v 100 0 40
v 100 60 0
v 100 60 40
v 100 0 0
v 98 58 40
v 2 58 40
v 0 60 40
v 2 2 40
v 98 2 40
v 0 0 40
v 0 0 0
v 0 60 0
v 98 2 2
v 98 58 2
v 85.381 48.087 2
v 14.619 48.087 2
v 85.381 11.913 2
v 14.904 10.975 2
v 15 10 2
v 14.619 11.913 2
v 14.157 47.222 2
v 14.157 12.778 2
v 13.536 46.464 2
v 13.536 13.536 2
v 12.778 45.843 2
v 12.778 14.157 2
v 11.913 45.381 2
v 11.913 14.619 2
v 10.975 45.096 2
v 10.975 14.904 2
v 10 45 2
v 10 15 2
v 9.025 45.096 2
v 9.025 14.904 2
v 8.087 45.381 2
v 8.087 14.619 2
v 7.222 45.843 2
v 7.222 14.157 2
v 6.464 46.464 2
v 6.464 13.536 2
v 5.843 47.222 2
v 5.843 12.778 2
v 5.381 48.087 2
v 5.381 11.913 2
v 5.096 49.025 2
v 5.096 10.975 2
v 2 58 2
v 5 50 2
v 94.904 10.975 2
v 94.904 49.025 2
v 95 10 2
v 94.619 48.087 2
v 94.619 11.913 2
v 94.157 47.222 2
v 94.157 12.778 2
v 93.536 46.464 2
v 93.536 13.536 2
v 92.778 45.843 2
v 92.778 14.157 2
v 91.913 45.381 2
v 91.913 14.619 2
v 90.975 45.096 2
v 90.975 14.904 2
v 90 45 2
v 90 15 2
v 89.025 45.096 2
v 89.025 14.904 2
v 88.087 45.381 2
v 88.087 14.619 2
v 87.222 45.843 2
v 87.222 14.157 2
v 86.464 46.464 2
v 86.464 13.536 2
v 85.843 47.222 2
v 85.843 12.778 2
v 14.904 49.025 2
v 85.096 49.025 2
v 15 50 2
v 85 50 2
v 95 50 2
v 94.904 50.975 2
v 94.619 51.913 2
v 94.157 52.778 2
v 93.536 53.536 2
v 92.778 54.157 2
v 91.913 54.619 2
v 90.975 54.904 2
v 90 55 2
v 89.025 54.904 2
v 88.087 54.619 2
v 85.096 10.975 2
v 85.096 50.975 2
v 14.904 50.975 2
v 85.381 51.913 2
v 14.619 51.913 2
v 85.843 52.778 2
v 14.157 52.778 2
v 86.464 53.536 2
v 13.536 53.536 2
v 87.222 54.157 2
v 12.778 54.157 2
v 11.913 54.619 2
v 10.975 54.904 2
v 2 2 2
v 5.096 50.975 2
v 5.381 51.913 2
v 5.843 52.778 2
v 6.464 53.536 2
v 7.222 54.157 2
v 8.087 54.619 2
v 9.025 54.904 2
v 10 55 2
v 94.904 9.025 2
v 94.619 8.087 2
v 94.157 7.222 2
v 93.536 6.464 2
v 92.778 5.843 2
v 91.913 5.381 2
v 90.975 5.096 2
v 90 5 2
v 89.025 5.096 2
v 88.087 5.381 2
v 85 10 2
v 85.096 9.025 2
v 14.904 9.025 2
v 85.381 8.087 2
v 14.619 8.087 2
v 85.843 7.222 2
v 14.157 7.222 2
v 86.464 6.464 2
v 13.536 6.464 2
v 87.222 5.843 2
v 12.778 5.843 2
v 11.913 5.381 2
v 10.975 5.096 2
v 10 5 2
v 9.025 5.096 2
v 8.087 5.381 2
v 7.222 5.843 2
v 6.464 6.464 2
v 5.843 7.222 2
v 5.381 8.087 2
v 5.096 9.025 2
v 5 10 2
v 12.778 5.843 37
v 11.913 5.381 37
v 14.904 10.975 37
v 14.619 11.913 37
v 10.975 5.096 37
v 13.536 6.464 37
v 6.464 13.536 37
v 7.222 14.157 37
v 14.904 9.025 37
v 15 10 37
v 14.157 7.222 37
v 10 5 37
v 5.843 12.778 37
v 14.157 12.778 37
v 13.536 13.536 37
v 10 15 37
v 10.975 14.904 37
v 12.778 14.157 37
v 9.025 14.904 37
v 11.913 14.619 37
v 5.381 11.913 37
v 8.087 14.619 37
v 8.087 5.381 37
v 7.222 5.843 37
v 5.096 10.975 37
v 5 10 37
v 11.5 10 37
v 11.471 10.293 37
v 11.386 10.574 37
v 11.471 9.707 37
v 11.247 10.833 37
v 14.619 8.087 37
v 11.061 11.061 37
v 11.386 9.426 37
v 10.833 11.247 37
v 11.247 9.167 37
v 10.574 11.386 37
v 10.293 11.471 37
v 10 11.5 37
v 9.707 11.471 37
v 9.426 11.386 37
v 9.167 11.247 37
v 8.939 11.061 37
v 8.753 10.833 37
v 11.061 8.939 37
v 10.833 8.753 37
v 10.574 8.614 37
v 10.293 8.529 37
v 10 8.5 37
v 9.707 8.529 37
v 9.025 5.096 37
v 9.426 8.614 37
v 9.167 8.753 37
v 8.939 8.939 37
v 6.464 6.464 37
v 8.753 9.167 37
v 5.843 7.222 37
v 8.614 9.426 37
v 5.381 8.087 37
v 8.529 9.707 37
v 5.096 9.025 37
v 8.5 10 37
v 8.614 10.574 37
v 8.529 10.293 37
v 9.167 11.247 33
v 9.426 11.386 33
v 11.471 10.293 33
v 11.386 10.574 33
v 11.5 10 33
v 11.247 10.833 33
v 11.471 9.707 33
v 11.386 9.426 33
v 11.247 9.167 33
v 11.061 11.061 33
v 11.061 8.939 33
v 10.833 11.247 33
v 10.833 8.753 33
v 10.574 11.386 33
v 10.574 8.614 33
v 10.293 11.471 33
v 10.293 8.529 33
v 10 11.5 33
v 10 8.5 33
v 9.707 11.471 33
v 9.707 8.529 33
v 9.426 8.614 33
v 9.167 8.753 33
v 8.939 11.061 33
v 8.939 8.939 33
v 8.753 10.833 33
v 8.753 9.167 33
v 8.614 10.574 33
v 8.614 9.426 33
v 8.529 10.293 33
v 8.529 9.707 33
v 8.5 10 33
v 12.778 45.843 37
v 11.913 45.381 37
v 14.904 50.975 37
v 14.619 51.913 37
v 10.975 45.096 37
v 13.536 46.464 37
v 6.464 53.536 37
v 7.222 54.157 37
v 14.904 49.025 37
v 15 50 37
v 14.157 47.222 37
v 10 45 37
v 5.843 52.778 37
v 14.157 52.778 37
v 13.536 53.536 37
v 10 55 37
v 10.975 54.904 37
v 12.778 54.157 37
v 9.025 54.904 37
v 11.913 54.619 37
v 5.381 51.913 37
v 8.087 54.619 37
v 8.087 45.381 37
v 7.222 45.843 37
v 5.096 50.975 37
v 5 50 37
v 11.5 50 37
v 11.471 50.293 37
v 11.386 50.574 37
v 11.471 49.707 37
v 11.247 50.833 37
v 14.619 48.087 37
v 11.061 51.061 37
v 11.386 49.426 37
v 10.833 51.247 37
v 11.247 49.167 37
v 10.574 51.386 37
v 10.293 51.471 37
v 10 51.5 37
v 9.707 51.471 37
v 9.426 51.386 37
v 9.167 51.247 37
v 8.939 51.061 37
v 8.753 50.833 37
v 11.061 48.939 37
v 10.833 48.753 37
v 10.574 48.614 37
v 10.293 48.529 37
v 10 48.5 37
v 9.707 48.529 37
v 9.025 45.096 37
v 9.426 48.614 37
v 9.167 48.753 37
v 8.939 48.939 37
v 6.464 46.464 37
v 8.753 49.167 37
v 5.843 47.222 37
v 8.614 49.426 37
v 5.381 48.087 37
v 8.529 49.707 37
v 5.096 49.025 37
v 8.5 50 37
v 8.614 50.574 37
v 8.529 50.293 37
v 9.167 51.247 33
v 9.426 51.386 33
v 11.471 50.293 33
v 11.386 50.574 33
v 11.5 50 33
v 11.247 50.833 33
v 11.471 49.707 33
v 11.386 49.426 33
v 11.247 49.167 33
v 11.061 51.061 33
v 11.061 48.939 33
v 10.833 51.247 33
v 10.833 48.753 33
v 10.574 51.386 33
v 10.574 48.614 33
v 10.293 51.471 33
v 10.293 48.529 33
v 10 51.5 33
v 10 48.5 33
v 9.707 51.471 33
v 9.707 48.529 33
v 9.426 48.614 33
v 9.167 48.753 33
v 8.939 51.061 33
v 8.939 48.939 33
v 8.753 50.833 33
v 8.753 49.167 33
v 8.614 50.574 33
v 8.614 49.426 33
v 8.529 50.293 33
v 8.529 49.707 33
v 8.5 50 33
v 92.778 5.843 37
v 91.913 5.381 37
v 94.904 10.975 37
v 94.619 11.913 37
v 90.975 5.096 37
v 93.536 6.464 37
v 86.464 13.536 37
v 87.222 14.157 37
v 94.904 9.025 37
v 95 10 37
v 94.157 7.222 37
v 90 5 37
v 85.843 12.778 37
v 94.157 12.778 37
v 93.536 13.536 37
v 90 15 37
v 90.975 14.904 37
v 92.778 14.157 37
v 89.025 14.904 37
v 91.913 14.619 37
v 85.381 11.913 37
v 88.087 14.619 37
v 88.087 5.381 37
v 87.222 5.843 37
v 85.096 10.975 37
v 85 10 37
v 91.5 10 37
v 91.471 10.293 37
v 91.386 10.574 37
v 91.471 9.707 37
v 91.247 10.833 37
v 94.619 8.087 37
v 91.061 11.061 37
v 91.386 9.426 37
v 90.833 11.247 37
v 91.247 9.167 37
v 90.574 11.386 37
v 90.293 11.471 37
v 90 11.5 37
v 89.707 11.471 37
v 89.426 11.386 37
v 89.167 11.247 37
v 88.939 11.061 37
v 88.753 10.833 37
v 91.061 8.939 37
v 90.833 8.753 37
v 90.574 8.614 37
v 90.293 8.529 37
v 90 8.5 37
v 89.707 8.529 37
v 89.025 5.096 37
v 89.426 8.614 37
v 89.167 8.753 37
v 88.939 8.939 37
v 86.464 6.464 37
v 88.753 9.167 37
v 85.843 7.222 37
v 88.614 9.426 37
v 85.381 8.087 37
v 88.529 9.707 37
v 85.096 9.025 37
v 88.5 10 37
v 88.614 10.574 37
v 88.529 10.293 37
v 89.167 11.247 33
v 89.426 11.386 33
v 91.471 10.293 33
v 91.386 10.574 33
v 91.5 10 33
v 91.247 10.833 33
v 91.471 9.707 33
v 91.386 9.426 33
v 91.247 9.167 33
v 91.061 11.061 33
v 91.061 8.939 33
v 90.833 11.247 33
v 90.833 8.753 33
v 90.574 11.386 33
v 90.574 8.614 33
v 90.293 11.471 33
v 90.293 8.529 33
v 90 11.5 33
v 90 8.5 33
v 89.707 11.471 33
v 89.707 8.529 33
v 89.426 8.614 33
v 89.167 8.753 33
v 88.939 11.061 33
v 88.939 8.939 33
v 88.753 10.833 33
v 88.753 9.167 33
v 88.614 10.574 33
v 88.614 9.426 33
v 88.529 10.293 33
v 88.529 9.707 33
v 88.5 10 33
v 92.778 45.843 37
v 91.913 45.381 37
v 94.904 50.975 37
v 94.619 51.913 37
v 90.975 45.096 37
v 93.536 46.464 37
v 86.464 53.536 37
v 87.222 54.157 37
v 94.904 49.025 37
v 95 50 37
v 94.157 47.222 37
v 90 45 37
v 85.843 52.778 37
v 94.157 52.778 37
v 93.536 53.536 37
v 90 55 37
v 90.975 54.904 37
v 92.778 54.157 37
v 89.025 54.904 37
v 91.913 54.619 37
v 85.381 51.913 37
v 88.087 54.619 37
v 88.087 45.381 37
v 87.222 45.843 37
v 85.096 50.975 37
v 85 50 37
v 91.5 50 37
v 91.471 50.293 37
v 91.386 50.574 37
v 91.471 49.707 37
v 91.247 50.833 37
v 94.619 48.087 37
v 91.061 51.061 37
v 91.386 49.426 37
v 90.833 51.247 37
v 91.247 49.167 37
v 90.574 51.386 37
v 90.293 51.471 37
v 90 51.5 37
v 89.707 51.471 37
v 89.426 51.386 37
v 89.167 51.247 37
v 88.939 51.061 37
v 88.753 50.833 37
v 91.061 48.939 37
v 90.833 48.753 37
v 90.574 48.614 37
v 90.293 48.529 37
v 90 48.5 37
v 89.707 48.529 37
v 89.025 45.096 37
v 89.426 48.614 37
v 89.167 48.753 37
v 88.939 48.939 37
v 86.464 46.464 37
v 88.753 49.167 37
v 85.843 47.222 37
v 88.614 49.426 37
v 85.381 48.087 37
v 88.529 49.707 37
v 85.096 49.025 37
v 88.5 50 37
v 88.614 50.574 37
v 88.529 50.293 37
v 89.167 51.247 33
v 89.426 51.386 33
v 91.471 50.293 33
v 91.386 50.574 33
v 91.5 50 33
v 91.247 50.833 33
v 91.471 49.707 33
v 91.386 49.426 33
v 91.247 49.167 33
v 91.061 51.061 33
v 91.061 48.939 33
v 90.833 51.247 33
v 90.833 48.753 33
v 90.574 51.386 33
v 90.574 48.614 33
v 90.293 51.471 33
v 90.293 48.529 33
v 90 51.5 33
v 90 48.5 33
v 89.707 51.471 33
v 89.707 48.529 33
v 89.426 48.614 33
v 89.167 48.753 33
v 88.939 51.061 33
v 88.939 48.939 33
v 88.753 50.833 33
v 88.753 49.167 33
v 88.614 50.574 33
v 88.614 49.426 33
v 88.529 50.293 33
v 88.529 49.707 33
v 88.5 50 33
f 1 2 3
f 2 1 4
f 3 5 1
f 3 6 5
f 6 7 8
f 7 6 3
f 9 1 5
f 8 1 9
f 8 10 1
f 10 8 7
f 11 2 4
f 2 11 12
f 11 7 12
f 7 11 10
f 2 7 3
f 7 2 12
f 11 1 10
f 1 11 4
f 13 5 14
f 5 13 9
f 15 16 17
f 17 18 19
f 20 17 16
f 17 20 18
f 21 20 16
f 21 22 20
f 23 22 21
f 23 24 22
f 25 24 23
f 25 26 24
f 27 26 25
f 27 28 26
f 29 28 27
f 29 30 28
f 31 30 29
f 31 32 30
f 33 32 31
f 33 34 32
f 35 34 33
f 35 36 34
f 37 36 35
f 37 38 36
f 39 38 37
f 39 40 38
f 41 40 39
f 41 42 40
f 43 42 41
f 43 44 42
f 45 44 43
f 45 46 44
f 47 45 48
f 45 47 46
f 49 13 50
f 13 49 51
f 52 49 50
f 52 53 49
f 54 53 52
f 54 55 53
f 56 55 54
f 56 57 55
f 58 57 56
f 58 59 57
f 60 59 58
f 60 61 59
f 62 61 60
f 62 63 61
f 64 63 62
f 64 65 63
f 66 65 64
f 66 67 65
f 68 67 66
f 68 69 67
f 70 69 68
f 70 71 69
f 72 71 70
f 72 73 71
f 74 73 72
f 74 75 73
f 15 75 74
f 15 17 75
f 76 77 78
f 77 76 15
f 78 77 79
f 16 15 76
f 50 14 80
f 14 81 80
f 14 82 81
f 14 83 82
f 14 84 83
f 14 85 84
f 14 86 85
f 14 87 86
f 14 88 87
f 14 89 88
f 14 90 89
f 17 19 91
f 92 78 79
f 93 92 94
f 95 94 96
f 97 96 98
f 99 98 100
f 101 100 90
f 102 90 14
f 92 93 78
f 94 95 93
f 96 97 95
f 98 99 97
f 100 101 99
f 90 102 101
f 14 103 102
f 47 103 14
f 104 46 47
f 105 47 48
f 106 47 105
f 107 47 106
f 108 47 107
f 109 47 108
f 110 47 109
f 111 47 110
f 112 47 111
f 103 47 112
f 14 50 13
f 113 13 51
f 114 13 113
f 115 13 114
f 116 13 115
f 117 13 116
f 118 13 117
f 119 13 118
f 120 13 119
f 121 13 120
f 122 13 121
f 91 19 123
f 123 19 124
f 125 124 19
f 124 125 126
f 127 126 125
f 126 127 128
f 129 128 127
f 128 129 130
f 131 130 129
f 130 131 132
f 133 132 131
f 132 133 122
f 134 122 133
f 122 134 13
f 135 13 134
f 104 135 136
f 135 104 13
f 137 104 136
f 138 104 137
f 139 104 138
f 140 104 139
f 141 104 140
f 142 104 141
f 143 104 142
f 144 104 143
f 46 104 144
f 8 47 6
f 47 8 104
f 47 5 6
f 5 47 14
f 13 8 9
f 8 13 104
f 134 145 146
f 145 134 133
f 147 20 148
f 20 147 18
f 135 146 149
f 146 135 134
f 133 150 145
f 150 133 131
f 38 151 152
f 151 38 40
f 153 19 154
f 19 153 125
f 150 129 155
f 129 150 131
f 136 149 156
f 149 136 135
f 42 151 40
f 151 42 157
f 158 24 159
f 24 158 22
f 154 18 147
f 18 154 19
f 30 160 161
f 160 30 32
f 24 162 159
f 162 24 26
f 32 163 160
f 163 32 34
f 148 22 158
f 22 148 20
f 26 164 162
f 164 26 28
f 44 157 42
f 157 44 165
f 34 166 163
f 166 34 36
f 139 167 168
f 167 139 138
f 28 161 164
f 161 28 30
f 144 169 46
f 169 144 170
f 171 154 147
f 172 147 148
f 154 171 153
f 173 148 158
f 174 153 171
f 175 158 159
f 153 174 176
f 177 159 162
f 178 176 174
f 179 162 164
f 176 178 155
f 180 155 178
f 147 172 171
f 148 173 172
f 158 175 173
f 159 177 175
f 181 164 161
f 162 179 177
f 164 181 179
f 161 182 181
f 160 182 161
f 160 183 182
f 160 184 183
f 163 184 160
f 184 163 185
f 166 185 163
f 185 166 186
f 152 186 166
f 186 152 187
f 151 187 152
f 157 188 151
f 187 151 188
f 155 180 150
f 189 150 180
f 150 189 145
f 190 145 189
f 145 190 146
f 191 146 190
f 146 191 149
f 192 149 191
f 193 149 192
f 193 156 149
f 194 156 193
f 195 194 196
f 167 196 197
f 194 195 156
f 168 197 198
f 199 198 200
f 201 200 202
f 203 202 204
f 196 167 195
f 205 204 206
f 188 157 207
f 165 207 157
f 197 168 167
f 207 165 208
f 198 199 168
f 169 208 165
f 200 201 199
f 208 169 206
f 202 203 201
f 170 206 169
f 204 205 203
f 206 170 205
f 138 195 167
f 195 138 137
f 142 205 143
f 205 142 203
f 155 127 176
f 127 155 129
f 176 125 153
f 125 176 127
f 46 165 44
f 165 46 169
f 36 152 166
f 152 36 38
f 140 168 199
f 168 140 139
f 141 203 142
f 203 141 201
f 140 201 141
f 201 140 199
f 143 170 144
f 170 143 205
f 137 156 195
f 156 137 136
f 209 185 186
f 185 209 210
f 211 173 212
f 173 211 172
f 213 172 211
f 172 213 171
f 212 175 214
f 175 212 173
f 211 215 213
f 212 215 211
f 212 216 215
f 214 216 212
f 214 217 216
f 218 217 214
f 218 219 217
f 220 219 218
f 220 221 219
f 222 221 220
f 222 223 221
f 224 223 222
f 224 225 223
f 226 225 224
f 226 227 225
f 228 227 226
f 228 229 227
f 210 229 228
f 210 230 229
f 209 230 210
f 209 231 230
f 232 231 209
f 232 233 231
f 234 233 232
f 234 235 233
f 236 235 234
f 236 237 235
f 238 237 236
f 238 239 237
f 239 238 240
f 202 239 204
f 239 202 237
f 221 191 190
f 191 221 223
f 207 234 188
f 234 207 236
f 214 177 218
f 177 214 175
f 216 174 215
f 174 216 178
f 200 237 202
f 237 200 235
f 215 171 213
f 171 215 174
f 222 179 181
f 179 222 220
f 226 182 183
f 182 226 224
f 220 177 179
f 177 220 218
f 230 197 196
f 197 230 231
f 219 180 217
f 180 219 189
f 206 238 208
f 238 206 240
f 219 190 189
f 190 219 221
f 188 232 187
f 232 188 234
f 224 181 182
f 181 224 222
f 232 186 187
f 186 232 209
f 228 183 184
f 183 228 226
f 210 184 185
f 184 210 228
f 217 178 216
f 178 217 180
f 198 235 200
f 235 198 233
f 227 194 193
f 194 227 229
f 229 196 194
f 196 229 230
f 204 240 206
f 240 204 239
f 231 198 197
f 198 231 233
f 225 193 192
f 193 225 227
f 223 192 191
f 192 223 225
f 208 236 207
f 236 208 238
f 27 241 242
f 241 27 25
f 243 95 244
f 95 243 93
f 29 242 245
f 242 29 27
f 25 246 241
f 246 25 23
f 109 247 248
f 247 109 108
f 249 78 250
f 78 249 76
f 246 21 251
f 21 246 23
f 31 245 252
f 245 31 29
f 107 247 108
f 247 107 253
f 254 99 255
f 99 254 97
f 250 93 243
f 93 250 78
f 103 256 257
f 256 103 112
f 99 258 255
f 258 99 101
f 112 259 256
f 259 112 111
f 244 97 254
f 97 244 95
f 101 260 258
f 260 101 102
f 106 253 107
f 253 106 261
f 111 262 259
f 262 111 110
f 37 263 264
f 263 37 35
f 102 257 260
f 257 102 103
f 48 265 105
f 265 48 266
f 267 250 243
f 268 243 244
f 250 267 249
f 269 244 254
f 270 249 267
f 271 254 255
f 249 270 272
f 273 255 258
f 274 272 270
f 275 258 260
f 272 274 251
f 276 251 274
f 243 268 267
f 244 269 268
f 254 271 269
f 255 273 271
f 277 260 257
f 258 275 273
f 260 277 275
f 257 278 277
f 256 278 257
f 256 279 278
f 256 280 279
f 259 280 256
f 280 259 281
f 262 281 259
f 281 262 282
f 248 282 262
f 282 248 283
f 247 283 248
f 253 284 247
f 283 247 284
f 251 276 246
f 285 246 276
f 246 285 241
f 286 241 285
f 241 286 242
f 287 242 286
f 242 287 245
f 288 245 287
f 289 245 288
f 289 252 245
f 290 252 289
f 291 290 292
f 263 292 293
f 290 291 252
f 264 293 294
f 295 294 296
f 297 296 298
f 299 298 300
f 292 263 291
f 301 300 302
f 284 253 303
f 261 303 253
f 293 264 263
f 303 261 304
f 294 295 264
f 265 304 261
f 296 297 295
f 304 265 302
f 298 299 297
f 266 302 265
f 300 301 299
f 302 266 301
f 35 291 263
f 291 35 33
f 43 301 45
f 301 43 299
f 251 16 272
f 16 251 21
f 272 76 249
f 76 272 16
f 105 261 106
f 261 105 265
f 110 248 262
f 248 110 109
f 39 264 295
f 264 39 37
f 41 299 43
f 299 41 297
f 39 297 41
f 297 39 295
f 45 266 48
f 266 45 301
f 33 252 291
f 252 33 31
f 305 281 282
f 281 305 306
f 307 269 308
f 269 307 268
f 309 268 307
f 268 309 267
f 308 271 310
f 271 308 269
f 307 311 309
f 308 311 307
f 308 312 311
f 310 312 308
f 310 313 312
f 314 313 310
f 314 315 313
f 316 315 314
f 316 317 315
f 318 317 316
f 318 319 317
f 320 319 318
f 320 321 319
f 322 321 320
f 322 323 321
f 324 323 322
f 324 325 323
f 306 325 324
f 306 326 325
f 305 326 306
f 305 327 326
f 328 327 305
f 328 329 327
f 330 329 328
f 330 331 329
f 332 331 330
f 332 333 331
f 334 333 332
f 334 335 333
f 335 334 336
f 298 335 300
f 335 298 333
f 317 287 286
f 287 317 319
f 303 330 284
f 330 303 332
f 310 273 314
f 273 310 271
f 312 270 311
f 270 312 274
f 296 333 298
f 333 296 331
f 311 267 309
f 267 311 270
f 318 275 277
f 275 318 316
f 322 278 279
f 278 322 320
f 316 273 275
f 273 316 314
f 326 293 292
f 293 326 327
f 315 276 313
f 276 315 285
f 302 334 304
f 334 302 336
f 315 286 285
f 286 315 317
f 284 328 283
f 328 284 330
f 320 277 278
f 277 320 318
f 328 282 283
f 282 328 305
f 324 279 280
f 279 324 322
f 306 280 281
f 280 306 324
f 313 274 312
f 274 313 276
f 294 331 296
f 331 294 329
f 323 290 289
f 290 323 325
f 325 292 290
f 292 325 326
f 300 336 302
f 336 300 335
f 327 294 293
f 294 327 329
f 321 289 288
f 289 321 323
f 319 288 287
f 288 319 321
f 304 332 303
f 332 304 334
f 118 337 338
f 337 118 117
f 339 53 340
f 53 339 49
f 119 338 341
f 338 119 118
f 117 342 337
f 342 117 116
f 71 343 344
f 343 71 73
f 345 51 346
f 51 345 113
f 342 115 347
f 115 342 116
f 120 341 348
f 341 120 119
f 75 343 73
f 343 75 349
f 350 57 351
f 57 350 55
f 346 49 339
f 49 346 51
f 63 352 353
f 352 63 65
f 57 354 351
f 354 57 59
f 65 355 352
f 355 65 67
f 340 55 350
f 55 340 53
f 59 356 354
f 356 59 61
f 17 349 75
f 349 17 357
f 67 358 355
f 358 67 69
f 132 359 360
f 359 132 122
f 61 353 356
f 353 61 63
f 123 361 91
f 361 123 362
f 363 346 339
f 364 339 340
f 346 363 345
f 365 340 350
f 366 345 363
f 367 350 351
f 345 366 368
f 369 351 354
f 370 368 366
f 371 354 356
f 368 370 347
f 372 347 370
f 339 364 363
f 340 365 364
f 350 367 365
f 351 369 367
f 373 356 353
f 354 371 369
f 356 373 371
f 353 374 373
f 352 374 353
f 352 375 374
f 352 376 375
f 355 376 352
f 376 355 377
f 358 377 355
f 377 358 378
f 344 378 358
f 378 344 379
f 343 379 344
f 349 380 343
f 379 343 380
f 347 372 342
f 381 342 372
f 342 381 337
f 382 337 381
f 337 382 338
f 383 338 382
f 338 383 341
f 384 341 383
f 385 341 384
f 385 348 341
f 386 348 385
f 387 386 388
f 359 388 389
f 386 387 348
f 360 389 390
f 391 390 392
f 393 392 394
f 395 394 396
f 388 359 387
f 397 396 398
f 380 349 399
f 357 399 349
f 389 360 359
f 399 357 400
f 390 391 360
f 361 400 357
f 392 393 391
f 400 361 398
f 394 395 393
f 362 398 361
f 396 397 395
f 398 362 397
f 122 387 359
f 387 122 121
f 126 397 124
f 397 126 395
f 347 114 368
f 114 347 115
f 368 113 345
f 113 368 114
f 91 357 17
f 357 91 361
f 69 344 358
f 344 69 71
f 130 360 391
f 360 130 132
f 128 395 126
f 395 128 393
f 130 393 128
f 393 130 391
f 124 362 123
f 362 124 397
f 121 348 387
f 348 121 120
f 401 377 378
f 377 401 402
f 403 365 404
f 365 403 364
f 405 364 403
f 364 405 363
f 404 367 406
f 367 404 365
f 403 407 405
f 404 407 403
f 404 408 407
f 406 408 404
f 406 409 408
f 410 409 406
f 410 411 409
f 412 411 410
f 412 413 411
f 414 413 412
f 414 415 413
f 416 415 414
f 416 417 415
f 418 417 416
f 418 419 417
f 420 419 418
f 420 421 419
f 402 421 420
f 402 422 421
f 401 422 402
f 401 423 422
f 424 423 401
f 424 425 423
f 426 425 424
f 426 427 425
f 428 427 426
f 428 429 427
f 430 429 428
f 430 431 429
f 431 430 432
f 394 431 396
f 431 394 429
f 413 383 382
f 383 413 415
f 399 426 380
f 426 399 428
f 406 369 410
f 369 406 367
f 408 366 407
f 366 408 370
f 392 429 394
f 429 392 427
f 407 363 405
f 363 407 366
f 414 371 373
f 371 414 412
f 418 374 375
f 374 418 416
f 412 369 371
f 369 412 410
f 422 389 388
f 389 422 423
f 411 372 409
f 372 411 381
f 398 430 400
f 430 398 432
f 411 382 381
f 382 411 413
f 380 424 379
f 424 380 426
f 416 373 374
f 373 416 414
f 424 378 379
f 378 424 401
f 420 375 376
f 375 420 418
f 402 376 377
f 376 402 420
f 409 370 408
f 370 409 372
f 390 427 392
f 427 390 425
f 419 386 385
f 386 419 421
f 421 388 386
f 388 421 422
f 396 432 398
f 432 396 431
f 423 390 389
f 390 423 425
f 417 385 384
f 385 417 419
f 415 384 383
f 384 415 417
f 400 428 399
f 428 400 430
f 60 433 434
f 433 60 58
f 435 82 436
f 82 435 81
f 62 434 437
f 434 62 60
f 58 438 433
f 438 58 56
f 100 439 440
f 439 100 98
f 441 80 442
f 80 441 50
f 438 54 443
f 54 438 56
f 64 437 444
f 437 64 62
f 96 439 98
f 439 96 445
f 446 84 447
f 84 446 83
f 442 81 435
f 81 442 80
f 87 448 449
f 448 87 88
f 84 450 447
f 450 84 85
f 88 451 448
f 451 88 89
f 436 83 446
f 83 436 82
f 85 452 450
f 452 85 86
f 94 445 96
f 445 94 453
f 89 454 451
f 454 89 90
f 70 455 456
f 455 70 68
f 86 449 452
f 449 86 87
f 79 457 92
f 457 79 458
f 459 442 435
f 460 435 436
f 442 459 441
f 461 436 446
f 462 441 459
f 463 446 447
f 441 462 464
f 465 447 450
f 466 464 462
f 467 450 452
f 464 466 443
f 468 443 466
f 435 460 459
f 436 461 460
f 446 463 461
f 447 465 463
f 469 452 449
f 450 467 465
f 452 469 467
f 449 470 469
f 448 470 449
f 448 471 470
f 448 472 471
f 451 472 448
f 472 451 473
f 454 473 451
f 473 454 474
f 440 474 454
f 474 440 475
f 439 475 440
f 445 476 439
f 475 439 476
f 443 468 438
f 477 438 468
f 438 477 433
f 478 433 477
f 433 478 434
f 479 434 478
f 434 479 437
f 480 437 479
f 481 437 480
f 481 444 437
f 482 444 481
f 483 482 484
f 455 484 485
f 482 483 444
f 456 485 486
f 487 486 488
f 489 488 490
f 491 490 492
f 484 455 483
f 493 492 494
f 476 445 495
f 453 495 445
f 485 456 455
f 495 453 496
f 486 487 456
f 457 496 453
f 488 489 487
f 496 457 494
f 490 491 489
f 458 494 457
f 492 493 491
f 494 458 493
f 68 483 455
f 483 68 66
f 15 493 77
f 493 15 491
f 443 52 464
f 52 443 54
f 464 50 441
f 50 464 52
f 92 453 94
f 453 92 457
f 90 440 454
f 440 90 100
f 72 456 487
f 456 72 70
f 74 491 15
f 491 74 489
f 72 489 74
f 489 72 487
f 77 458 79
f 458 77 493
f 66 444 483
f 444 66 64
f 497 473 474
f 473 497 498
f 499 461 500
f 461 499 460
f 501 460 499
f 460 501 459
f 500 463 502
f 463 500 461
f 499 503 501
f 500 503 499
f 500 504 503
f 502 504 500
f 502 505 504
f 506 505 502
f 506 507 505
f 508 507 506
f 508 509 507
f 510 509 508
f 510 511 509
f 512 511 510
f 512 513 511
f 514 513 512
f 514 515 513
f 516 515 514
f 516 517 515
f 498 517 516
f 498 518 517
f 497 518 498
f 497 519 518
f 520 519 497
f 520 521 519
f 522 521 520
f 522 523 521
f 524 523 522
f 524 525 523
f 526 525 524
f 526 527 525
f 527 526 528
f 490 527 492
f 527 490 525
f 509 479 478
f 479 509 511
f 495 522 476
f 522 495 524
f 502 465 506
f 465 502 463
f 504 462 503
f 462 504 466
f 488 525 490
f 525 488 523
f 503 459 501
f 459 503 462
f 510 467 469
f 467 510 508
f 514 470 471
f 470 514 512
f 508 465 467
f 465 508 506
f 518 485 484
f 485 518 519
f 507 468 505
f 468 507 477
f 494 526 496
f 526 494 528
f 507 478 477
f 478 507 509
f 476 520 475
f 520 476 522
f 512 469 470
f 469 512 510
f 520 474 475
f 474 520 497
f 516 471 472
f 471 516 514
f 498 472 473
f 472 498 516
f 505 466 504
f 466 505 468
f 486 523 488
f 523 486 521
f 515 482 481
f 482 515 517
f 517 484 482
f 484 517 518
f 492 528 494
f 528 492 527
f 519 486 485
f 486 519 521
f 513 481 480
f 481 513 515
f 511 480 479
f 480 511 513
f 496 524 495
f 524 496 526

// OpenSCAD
$fn = 32;

// ----------------------------------------------------------------------
// Enclosure box: bosses enclosure
// ----------------------------------------------------------------------

// --- parameters (mm) ---
box_l = 100;              // outer length, X
box_w = 60;               // outer width, Y
box_h = 40;               // outer height
wall_t = 2;               // wall thickness
boss_r = 5;               // corner boss radius
hole_r = 1.5;             // boss screw hole radius
boss_in = 10;             // boss inset from the corners
fit_tol = 0.1;            // tolerance for press fits, mm
free_tol = 0.5;           // tolerance for clearance fits, mm

inner_h = box_h - wall_t;  // cavity depth
boss_h = inner_h - 2;  // corner boss height

difference() {
  union() {
    difference() {
      cube([box_l, box_w, box_h]);
      translate([wall_t, wall_t, wall_t])
        cube([box_l - 2 * wall_t, box_w - 2 * wall_t, box_h]);
    }
    for (sx = [0, 1], sy = [0, 1])
      translate([sx ? box_l - boss_in : boss_in,
                 sy ? box_w - boss_in : boss_in, wall_t - 1])
        difference() {
          cylinder(r = boss_r, h = boss_h);
          translate([0, 0, boss_h - 4])
            cylinder(r = hole_r, h = 5);
        }
  }
}
